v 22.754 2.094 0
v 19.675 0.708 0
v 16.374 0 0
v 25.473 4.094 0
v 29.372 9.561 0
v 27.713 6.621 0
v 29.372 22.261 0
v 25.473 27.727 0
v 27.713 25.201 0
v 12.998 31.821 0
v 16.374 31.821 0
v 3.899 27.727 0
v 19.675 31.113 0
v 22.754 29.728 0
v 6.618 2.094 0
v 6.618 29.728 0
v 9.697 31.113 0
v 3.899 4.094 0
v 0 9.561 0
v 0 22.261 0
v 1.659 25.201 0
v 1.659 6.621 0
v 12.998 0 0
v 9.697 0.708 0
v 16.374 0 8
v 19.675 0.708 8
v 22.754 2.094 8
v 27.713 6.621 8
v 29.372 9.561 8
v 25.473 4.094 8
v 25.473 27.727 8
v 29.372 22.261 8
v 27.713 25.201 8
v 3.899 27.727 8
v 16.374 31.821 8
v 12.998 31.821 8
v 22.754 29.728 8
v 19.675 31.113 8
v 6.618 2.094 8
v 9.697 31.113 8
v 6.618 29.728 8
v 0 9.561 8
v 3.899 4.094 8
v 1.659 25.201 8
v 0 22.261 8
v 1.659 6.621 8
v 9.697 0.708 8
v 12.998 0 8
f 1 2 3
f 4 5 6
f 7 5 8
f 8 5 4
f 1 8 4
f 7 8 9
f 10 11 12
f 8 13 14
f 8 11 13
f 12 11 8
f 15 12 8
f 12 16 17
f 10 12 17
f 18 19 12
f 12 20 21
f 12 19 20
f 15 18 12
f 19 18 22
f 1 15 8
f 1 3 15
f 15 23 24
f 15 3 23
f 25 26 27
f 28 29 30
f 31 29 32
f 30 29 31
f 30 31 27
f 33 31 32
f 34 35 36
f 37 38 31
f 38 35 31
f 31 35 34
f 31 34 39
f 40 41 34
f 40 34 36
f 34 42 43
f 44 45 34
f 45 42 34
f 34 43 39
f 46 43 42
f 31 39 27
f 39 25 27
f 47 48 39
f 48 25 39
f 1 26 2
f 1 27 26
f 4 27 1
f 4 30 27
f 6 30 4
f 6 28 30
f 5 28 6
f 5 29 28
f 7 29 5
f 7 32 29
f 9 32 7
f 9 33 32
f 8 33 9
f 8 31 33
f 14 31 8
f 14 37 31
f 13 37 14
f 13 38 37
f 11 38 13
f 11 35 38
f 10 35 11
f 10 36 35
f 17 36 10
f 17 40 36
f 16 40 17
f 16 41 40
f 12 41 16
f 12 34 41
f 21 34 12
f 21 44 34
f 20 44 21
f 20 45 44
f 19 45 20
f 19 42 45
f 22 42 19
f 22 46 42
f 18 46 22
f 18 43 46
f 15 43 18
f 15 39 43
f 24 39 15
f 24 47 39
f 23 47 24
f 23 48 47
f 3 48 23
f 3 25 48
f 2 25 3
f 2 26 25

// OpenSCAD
$fn = 32;

// ----------------------------------------------------------------------
// Flat adaptor: double_d, 8 mm thick
// ----------------------------------------------------------------------

// --- parameters (mm) ---
profile_height = 8;       // extrusion height
profile_points = 24;      // points of the closed outline

profile = [[29.372, 22.261], [27.713, 25.201], [25.473, 27.727], [22.754, 29.728], [19.675, 31.113], [16.374, 31.821], [12.998, 31.821], [9.697, 31.113], [6.618, 29.728], [3.899, 27.727], [1.659, 25.201], [0, 22.261], [0, 9.561], [1.659, 6.621], [3.899, 4.094], [6.618, 2.094], [9.697, 0.708], [12.998, 0], [16.374, 0], [19.675, 0.708], [22.754, 2.094], [25.473, 4.094], [27.713, 6.621], [29.372, 9.561]];  // single closed polygon, 24 points, counter clockwise

// --- the one profile operation ---
linear_extrude(height = profile_height) polygon(points = profile);
